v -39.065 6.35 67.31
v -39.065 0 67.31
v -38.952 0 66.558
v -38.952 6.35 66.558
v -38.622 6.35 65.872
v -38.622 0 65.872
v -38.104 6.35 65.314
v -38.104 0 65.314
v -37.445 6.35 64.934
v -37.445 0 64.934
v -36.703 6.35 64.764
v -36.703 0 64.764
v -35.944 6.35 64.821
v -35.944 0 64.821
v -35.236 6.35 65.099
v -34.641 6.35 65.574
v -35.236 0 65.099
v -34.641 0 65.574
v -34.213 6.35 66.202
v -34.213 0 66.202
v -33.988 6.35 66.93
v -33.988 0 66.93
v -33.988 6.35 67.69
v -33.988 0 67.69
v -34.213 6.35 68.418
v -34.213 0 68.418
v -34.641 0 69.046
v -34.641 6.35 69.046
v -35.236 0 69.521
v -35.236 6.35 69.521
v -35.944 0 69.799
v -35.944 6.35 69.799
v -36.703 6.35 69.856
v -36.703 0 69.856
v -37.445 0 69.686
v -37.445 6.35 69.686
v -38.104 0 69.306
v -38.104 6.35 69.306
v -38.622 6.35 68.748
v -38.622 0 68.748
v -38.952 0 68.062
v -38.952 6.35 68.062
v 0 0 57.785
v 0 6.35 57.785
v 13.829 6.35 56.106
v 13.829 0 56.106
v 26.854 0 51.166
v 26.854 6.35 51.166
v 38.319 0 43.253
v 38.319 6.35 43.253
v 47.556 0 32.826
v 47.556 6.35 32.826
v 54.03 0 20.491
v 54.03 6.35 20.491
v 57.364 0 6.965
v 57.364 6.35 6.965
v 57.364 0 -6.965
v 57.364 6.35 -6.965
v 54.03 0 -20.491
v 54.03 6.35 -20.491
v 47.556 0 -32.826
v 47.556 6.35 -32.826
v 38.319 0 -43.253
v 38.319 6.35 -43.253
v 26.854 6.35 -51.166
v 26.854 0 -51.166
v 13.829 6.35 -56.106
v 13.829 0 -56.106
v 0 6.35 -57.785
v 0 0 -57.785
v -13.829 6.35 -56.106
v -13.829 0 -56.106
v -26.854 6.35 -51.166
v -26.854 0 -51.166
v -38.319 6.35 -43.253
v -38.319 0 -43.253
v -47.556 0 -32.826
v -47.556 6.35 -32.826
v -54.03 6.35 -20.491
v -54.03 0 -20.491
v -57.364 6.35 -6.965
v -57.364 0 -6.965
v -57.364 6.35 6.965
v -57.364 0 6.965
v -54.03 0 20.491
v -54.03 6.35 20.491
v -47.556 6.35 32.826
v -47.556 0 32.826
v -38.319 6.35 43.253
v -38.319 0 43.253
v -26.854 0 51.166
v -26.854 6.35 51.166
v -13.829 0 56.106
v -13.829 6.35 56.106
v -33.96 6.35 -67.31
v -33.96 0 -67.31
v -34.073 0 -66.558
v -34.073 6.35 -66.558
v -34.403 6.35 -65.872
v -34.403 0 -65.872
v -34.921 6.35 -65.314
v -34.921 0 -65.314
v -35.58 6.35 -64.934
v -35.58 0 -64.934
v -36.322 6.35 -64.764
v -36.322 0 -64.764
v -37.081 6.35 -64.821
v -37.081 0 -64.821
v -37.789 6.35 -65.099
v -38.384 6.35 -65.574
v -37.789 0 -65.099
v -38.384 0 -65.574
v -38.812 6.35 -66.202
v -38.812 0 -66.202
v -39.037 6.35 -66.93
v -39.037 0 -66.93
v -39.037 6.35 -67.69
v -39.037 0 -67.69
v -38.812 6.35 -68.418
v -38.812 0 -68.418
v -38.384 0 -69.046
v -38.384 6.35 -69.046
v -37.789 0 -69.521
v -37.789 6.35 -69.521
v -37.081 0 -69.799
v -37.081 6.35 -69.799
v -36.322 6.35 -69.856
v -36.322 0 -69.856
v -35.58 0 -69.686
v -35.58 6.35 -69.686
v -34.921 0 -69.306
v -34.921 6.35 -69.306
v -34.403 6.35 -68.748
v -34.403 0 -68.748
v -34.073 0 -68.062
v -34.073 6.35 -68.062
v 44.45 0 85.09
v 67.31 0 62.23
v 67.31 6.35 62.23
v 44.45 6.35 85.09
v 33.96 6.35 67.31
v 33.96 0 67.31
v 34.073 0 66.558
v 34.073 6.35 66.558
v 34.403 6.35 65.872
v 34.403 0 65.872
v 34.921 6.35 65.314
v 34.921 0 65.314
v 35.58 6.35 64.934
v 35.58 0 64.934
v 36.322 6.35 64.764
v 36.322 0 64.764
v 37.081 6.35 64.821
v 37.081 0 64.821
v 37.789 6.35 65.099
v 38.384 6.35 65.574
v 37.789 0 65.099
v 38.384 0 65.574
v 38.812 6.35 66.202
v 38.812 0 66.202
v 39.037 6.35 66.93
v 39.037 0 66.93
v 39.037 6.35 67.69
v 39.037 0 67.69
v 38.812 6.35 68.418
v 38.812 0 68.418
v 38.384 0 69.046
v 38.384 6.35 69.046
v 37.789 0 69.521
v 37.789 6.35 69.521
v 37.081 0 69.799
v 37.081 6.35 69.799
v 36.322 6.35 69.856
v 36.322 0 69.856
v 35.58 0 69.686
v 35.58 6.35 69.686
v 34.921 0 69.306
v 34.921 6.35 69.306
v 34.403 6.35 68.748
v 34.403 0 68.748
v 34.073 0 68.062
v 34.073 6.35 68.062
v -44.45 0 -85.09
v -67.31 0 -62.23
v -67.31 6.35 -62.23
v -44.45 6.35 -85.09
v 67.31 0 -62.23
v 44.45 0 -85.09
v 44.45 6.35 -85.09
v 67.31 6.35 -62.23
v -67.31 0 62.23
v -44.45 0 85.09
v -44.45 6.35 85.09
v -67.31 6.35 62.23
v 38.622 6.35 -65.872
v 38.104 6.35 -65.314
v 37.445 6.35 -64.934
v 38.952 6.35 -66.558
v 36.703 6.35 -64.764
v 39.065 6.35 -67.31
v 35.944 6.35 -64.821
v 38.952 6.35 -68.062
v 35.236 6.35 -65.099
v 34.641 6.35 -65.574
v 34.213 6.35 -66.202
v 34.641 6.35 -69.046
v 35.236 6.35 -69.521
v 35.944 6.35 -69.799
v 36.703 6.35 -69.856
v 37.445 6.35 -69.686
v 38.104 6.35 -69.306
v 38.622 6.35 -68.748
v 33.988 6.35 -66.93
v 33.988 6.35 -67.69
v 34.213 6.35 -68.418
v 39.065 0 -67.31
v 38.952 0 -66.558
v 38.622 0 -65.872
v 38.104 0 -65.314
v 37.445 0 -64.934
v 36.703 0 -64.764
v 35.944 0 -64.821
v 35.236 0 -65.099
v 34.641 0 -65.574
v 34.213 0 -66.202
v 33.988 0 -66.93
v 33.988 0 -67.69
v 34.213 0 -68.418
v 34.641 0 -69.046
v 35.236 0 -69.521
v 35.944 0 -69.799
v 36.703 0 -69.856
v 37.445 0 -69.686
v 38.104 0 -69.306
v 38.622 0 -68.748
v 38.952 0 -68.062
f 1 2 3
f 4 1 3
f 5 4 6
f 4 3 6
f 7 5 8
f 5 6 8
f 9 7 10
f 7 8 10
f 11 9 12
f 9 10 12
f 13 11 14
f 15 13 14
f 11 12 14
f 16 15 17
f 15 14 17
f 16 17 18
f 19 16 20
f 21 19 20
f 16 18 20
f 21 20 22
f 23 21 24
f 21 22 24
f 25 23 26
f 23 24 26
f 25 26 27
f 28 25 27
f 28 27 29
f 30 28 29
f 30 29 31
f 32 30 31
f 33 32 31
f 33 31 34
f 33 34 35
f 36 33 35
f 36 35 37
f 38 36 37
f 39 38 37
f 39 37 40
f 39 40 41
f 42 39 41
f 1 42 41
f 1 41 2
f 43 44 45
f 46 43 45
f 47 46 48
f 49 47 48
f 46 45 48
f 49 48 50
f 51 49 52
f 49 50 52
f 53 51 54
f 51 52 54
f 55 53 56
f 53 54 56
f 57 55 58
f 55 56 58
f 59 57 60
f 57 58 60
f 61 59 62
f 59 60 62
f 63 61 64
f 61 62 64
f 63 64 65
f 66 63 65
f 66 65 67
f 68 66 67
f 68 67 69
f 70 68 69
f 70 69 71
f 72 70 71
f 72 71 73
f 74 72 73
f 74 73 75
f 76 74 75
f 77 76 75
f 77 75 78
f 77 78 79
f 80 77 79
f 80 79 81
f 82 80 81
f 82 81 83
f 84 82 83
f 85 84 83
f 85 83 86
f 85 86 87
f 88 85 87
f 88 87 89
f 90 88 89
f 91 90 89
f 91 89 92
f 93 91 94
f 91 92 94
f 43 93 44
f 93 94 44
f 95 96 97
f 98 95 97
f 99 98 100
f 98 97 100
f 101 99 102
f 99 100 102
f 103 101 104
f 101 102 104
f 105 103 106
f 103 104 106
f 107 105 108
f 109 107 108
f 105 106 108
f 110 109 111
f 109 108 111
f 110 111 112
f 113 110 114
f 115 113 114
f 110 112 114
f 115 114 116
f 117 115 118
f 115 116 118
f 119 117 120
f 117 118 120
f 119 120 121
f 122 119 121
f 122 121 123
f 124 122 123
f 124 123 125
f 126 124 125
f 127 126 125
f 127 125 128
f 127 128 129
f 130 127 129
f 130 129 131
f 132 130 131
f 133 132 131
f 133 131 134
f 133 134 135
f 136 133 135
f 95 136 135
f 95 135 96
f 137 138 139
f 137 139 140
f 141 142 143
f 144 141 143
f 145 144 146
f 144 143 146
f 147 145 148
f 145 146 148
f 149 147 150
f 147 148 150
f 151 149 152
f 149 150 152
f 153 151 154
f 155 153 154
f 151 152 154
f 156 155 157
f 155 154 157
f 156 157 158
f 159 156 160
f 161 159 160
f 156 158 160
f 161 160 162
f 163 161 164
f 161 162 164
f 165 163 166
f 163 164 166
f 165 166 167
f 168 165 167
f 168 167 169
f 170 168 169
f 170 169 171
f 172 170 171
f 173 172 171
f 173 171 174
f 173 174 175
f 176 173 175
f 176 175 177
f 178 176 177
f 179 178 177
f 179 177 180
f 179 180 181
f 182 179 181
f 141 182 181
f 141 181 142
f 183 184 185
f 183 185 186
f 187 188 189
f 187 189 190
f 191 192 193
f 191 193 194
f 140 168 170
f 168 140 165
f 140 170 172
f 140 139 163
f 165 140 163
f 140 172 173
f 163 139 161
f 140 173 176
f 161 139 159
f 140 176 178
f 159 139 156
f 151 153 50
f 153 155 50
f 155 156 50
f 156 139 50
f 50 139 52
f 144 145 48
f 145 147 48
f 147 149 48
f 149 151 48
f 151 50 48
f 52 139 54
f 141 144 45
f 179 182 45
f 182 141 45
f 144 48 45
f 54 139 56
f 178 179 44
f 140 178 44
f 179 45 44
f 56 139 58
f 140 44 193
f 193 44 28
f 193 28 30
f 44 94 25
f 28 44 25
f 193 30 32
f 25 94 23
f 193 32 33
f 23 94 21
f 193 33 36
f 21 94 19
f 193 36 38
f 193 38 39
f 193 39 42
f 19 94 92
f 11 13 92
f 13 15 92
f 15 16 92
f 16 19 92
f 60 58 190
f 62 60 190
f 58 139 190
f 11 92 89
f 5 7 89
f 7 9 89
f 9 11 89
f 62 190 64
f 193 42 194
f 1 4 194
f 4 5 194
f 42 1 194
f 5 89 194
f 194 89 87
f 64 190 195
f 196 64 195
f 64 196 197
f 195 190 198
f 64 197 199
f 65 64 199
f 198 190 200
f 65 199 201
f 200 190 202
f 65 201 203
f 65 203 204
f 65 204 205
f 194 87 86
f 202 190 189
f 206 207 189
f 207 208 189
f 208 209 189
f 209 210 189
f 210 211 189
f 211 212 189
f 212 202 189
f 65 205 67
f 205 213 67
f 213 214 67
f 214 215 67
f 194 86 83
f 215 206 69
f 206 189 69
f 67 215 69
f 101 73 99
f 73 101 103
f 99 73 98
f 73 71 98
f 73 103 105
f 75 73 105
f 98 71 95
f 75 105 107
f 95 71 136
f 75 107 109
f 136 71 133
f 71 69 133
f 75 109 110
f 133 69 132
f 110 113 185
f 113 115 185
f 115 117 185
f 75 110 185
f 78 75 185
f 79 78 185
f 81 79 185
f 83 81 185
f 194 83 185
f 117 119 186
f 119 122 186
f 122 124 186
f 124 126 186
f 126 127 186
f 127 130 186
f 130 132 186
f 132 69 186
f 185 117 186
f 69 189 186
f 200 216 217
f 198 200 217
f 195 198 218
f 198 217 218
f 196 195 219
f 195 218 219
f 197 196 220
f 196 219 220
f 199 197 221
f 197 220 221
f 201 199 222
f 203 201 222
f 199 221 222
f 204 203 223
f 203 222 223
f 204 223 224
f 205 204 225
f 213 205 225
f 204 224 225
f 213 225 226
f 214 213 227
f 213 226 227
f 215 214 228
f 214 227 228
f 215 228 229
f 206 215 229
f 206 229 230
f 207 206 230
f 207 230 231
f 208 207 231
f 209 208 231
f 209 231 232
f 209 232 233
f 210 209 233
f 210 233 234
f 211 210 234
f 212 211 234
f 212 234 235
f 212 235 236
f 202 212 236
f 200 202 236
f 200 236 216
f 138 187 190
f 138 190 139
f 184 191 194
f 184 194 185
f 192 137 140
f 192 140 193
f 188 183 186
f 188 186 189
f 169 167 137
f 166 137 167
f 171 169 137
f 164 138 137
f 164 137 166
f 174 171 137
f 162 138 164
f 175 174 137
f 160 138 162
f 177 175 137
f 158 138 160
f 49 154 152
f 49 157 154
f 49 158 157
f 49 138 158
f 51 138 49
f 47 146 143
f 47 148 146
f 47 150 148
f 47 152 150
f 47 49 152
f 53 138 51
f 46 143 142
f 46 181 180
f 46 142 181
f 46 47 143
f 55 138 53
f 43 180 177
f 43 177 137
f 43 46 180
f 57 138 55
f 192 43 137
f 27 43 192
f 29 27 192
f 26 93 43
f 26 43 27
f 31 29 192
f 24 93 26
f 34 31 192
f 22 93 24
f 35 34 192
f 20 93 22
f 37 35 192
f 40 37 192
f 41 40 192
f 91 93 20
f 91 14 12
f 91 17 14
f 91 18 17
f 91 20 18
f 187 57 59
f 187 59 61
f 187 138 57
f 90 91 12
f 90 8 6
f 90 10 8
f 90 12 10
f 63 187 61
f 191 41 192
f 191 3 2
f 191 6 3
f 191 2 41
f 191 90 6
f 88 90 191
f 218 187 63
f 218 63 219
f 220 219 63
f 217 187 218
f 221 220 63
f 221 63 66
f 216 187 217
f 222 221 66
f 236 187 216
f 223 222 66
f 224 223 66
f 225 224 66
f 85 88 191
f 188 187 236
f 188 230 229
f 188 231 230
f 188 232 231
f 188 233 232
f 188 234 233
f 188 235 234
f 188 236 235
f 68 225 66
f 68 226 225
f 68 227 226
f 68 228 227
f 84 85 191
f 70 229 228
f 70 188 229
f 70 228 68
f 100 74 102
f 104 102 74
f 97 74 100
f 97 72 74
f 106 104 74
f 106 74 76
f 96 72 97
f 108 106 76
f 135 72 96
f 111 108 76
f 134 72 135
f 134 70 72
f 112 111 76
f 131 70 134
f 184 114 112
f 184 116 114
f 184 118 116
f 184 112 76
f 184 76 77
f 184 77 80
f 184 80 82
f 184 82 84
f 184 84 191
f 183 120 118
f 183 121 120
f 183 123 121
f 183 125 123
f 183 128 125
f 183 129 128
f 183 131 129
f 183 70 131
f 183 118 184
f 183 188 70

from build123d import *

# Parameters (mm, degrees)
BOSS_EXTRUDE1_DEPTH    = 6.35
F_10_CLEARANCE_HOLE1_D = 5.1054
CIRPATTERN1_COUNT      = 2
SKETCH4_R              = 57.785
CUT_EXTRUDE1_DEPTH     = 109.679651729


with BuildPart() as part:
    # Sketch1 → Boss-Extrude1 (new body)
    with BuildSketch(Plane(origin=(0, 0, 0), x_dir=(1, 0, 0), z_dir=(0, 1, 0))):
        Polygon((-67.31, 62.23), (-44.45, 85.09), (44.45, 85.09), (67.31, 62.23), (67.31, -62.23), (44.45, -85.09), (-44.45, -85.09), (-67.31, -62.23), align=None)
    extrude(amount=BOSS_EXTRUDE1_DEPTH)

    # #10 Clearance Hole1 (through all)
    with Locations(Plane(origin=(0, 6.35, 0), x_dir=(-1, 0, 0), z_dir=(0, 1, 0))):
        with Locations((36.5125, -67.31), (-36.5125, -67.31)):
            f_10_clearance_hole1 = Hole(F_10_CLEARANCE_HOLE1_D / 2)

    # CirPattern1: #10 Clearance Hole1 ×2 about axis
    cirpattern1_axis = Axis((0, 0, 0), (0, 1, 0))
    for i in range(1, CIRPATTERN1_COUNT):
        add(f_10_clearance_hole1.rotate(cirpattern1_axis, i * 360 / CIRPATTERN1_COUNT), mode=Mode.SUBTRACT)

    # Sketch4 → Cut-Extrude1 (cut, through all)
    with BuildSketch(Plane(origin=(0, 6.35, 0), x_dir=(1, 0, 0), z_dir=(0, 1, 0))):
        Circle(SKETCH4_R)
    extrude(amount=-CUT_EXTRUDE1_DEPTH, mode=Mode.SUBTRACT)


solid = part.part
